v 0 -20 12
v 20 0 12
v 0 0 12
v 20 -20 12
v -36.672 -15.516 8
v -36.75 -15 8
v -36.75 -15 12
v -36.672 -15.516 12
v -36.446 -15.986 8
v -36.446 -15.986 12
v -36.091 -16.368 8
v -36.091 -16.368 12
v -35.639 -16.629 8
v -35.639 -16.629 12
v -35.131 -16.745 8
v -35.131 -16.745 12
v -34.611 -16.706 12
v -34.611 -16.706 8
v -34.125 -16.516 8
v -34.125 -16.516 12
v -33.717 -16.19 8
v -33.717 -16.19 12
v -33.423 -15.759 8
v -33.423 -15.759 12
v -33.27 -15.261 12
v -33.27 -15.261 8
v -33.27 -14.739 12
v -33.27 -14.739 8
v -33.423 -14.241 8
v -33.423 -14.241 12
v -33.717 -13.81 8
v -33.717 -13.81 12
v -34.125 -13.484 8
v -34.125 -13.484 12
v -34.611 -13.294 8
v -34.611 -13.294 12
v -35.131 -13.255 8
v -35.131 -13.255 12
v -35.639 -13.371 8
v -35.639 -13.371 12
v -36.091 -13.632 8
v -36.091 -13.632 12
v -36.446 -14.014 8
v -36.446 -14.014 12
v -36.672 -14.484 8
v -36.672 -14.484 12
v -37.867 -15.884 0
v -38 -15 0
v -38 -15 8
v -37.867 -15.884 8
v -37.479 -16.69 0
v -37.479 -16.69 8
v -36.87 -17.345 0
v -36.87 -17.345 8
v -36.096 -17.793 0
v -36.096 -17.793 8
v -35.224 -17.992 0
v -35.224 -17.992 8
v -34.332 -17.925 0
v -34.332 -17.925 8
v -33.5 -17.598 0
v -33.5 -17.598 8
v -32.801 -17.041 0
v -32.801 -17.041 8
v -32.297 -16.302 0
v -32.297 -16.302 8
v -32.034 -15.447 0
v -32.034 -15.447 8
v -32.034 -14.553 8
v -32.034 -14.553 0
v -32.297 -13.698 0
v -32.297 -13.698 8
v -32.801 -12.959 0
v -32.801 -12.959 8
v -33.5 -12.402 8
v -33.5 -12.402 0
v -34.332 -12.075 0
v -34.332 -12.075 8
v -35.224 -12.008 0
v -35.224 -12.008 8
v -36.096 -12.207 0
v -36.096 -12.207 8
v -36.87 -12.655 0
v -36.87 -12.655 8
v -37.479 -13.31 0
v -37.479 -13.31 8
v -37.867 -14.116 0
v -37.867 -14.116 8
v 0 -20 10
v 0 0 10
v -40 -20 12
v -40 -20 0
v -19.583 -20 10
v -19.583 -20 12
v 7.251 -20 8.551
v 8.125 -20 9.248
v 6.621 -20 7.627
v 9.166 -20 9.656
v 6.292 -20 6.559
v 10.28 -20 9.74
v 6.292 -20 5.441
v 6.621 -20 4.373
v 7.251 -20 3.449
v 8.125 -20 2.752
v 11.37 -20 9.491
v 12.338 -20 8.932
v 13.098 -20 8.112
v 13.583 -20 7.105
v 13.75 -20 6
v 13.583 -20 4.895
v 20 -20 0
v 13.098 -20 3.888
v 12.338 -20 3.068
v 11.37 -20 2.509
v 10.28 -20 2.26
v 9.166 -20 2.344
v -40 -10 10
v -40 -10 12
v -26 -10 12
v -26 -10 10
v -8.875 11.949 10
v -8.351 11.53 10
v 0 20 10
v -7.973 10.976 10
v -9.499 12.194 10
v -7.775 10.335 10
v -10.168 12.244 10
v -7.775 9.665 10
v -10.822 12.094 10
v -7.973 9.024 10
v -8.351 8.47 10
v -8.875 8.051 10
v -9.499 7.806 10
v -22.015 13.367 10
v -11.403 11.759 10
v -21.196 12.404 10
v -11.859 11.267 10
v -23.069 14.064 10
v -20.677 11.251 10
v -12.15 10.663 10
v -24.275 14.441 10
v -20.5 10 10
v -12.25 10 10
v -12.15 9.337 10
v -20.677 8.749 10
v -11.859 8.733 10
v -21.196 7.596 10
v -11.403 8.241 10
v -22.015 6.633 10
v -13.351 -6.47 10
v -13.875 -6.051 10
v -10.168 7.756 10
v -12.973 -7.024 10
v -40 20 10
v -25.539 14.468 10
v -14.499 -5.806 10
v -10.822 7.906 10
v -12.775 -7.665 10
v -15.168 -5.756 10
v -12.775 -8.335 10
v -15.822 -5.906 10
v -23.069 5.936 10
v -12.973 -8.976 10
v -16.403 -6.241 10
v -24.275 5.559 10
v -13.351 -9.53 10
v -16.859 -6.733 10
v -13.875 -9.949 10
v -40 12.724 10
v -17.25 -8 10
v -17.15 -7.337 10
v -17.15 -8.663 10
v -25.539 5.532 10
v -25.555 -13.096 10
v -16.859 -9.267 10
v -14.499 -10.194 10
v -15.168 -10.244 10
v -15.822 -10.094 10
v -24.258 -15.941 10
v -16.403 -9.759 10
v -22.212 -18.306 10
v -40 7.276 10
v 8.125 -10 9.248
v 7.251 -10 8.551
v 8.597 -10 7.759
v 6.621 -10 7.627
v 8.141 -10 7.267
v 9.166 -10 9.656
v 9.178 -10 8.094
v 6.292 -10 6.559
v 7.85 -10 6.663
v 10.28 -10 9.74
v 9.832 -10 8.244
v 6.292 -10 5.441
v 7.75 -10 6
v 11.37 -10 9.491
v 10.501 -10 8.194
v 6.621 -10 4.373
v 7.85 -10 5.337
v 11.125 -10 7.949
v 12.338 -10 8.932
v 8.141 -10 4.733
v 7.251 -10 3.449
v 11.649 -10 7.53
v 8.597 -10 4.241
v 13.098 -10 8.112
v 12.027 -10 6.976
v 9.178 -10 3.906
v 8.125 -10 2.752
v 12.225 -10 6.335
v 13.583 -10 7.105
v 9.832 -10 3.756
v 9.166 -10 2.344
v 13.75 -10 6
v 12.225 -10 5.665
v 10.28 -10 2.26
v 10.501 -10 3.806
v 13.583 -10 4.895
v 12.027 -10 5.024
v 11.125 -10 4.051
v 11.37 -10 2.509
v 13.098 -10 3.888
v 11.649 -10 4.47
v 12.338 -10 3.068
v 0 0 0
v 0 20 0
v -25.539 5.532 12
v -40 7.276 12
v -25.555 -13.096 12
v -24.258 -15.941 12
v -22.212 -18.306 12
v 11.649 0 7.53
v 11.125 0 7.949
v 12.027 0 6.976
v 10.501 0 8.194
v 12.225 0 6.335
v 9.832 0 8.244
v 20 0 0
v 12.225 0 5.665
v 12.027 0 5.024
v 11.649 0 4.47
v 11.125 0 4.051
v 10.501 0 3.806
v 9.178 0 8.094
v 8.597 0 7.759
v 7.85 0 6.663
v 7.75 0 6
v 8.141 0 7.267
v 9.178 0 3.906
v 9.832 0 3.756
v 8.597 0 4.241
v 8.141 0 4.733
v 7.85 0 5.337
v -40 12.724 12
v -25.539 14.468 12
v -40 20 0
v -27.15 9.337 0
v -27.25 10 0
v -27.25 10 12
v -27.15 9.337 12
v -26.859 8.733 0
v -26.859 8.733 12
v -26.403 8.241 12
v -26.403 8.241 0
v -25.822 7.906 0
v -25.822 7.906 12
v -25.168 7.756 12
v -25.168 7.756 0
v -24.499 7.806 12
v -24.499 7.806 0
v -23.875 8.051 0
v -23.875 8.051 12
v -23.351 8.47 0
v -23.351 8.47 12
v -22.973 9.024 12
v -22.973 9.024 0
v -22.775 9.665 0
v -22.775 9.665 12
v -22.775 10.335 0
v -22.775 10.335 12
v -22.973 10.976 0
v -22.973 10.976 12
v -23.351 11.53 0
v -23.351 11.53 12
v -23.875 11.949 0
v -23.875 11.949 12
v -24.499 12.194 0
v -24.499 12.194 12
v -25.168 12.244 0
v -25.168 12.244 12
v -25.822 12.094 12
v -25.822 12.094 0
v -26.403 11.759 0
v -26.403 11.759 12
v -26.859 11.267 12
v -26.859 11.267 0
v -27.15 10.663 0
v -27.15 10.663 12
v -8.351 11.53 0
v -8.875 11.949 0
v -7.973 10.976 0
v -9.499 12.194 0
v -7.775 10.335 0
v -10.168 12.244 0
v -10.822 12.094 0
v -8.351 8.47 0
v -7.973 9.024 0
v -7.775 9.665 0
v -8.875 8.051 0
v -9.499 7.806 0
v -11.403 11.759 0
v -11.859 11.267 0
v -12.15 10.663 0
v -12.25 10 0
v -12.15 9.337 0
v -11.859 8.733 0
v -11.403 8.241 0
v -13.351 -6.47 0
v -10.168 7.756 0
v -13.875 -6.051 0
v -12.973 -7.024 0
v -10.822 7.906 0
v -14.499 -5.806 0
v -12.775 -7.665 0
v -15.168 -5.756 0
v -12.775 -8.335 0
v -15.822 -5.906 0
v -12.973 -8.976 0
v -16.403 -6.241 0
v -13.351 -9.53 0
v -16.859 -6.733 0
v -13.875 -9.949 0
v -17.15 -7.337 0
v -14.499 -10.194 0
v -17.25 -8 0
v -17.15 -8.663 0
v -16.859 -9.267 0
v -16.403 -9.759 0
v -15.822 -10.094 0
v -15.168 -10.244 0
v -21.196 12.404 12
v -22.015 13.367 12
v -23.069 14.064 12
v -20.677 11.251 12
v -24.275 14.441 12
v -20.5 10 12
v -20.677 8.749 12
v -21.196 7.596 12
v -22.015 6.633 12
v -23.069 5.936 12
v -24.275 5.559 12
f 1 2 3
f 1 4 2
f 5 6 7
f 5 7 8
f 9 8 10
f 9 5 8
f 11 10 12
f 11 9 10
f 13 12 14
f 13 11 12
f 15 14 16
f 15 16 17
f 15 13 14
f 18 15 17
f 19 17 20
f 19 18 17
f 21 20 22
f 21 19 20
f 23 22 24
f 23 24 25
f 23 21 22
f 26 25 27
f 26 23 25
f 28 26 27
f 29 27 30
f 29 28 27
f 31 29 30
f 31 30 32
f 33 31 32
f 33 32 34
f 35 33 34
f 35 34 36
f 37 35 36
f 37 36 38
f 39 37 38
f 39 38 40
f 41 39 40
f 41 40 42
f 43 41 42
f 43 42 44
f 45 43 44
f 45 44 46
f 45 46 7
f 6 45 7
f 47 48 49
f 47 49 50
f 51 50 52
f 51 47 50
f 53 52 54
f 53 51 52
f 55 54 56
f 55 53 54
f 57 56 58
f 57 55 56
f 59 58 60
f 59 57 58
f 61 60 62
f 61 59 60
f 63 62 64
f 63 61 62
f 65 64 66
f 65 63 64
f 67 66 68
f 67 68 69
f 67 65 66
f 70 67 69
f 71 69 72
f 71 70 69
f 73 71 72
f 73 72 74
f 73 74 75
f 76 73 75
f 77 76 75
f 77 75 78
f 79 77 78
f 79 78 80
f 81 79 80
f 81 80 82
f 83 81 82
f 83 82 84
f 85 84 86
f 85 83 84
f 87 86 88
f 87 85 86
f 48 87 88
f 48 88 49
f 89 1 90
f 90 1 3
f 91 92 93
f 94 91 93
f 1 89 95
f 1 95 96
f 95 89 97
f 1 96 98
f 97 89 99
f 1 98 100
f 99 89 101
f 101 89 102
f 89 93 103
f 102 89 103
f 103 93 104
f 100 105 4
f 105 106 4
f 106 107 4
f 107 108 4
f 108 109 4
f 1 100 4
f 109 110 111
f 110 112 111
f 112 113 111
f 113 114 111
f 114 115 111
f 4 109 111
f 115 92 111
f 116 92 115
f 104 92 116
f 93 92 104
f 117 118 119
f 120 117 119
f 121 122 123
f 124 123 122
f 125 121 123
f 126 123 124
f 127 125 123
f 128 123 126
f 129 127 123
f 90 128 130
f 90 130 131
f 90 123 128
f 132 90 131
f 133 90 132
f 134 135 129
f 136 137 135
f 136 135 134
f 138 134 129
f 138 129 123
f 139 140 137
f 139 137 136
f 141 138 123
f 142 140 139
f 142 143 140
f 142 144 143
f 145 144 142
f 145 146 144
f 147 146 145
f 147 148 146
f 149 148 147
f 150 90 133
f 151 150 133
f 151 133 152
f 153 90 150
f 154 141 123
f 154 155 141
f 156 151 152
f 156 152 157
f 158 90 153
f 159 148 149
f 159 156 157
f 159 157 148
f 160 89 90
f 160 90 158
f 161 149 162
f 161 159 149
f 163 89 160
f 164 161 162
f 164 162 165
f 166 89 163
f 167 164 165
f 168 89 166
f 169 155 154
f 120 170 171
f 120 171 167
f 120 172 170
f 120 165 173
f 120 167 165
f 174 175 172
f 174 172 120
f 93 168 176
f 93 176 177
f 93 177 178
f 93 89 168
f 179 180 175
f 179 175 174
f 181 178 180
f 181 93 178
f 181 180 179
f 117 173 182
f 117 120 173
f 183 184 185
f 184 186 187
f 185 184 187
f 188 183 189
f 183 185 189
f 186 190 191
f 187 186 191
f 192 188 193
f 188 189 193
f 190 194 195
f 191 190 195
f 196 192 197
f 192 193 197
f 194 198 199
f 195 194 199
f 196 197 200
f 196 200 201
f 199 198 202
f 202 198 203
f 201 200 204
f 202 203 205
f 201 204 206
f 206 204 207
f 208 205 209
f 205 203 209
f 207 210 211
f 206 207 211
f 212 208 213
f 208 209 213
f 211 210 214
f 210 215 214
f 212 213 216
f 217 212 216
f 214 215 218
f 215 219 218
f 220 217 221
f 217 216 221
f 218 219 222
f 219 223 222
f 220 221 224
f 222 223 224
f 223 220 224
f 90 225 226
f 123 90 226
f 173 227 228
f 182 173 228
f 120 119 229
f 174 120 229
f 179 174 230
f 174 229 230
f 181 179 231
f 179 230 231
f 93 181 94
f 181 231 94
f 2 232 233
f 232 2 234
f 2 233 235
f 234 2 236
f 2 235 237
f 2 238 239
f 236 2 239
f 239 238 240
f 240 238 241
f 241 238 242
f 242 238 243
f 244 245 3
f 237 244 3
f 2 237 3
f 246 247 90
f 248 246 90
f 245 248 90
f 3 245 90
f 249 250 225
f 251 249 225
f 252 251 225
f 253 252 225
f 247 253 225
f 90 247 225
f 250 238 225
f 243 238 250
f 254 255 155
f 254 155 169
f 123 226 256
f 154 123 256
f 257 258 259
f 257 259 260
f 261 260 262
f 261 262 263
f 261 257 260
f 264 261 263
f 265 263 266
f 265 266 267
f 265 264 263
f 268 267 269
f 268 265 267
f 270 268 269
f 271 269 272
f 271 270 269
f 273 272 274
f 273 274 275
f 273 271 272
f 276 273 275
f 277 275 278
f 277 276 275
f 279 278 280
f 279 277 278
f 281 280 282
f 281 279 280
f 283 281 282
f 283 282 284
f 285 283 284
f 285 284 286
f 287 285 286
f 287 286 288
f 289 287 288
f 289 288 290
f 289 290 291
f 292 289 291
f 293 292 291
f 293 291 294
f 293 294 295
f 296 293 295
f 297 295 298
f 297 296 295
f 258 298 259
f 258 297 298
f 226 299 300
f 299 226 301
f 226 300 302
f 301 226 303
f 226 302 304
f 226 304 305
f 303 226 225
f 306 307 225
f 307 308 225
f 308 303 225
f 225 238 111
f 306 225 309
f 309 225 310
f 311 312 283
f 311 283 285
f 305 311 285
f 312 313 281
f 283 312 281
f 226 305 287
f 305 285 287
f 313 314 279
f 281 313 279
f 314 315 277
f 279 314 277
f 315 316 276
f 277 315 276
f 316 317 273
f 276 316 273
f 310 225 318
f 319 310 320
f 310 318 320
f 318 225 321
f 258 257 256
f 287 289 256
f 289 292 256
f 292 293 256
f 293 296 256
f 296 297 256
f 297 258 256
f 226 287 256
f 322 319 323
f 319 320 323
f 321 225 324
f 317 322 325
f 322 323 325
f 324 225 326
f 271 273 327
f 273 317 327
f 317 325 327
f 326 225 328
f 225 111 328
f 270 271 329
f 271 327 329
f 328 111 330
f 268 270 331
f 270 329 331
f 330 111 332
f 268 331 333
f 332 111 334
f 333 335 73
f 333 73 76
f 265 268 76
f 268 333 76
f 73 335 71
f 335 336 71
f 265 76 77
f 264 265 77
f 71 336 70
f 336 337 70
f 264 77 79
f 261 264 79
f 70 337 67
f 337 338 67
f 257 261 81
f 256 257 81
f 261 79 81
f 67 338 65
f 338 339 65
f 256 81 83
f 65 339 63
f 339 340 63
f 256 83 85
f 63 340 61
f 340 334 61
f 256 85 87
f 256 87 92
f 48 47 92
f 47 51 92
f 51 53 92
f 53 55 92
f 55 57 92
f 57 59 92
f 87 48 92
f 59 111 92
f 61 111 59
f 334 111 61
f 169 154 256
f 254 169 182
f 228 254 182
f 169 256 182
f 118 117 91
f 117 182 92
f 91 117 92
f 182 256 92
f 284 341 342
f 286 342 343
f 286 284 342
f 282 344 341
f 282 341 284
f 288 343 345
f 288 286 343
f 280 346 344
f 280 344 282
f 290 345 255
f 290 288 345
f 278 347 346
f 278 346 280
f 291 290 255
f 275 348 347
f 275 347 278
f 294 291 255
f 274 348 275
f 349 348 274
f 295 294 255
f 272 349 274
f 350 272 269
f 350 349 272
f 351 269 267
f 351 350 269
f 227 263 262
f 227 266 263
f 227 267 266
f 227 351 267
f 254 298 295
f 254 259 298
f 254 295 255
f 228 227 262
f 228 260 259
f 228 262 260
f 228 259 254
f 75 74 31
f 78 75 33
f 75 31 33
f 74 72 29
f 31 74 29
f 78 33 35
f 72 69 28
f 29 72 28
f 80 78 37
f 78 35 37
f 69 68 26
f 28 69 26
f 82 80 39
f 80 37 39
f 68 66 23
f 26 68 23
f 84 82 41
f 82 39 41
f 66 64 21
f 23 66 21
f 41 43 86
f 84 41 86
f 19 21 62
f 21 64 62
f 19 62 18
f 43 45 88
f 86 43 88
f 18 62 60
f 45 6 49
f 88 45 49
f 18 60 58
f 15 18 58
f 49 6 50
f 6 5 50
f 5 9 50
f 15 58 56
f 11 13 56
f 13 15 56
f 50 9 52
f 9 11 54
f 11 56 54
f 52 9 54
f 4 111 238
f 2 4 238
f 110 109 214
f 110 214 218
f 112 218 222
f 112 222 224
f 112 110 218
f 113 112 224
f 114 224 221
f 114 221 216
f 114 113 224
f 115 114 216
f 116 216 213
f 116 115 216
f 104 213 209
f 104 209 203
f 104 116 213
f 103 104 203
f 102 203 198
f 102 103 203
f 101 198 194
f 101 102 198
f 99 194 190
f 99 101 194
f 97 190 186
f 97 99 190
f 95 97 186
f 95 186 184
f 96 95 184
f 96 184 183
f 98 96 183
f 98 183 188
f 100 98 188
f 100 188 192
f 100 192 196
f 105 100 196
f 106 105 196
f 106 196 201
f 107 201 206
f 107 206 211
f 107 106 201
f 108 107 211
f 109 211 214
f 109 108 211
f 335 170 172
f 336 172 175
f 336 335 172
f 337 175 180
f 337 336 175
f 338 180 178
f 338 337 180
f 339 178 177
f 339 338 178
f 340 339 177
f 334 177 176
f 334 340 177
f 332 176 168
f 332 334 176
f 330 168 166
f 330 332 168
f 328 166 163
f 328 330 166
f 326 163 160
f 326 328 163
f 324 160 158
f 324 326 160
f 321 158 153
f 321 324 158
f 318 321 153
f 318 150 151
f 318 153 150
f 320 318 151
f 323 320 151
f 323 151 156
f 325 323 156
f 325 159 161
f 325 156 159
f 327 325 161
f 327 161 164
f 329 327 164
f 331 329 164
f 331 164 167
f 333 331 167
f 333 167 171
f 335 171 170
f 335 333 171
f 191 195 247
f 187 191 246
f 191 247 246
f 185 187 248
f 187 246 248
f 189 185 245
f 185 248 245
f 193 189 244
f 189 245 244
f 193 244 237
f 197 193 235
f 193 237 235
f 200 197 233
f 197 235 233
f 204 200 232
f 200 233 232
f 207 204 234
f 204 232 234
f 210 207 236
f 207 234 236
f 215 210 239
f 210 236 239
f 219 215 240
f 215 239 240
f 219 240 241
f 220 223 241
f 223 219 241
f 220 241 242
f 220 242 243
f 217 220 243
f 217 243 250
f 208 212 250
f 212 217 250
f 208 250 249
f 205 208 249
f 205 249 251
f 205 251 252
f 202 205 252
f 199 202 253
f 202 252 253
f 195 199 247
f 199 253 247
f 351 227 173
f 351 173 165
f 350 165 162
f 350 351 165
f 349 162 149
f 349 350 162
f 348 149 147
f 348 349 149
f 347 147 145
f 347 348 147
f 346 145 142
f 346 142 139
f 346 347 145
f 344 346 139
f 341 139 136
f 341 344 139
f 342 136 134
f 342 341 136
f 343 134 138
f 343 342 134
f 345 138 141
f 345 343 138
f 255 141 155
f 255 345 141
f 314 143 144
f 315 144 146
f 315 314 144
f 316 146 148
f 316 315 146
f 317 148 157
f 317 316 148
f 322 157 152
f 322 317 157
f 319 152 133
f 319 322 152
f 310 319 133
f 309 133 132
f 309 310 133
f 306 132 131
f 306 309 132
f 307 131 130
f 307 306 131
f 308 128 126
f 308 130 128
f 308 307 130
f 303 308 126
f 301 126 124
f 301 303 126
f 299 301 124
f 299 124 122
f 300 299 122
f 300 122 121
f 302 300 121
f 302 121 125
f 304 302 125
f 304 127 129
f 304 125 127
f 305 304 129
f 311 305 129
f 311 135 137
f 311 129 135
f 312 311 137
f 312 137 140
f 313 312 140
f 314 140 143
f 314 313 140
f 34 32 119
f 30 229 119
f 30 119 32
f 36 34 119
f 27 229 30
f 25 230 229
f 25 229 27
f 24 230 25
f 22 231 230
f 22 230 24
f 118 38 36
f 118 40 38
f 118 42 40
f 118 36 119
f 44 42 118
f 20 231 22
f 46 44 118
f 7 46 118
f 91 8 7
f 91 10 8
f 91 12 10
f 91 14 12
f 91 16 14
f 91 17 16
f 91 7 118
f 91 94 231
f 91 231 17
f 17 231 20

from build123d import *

# Parameters (mm, degrees)
SKETCH_R                       = 2.25
SKETCH_R_2                     = 1.75
PAD_DEPTH                      = 12
POCKET_DEPTH                   = 2
SKETCH002_R                    = 2.25
POCKET002_DEPTH                = 20.001
PART_MIRRORING_PLACEMENT_ANGLE = 180
SKETCH003_R                    = 3
POCKET003_DEPTH                = 8
SKETCH004_R                    = 3.75
POCKET004_DEPTH                = 10


with BuildPart() as pocket002:
    # Sketch → Pad (new body)
    with BuildSketch(Plane.XY):
        Polygon((0, -20), (40, -20), (40, 20), (-20, 20), (-20, 0), (0, 0), align=None)
        with Locations((15, 8)):
            Circle(SKETCH_R, mode=Mode.SUBTRACT)
        with Locations((10, -10)):
            Circle(SKETCH_R, mode=Mode.SUBTRACT)
        with Locations((35, 15)):
            Circle(SKETCH_R_2, mode=Mode.SUBTRACT)
        with Locations((25, -10)):
            Circle(SKETCH_R, mode=Mode.SUBTRACT)
    extrude(amount=PAD_DEPTH)

    # Sketch001 → Pocket (cut)
    with BuildSketch(Plane.XY.offset(12)):
        with BuildLine():
            Line((46, 10), (26, 10))
            ThreePointArc((26, 10), (22.778175, 17.778175), (15, 21))
            Line((15, 21), (0, 21))
            Line((0, 21), (0, -23))
            Line((0, -23), (46, -23))
            Line((46, -23), (46, -12))
            Line((25.538775, -14.46763), (46, -12))
            ThreePointArc((25.538775, -5.53237), (20.5, -10), (25.538775, -14.46763))
            Line((25.538775, -5.53237), (46, -8))
            Line((46, -8), (46, 10))
        make_face()
    extrude(amount=-POCKET_DEPTH, mode=Mode.SUBTRACT)

    # Sketch002 → Pocket002 (cut, through all)
    with BuildSketch(Plane.XZ):
        with Locations((-10, 6)):
            Circle(SKETCH002_R)
    extrude(amount=-POCKET002_DEPTH, mode=Mode.SUBTRACT)


with BuildPart() as pocket004:
    # Part__Mirroring: instance of Pocket002
    add(pocket002.part.mirror(Plane(origin=(0, 0, 0), x_dir=(0, 1, 0), z_dir=(0, 0, 1))))


with BuildPart() as pocket004_1:
    # Part__Mirroring placement: moved
    add(pocket004.part.rotate(Axis((0, 0, 0), (1, 0, 0)), PART_MIRRORING_PLACEMENT_ANGLE))

    # Sketch003 → Pocket003 (cut)
    with BuildSketch(Plane(origin=(0, 0, 0), x_dir=(1, 0, 0), z_dir=(0, 0, -1))):
        with Locations((35, 15)):
            Circle(SKETCH003_R)
    extrude(amount=-POCKET003_DEPTH, mode=Mode.SUBTRACT)

    # Sketch004 → Pocket004 (cut)
    with BuildSketch(Plane(origin=(0, -20, 0), x_dir=(-1, 0, 0), z_dir=(0, -1, 0))):
        with Locations((10, -6)):
            Circle(SKETCH004_R)
    extrude(amount=-POCKET004_DEPTH, mode=Mode.SUBTRACT)


with BuildPart() as part_mirroring001:
    # Part__Mirroring001: instance of Pocket004
    add(pocket004_1.part.mirror(Plane(origin=(0, 0, 0), x_dir=(0, -1, 0), z_dir=(1, 0, 0))))


solid = part_mirroring001.part
